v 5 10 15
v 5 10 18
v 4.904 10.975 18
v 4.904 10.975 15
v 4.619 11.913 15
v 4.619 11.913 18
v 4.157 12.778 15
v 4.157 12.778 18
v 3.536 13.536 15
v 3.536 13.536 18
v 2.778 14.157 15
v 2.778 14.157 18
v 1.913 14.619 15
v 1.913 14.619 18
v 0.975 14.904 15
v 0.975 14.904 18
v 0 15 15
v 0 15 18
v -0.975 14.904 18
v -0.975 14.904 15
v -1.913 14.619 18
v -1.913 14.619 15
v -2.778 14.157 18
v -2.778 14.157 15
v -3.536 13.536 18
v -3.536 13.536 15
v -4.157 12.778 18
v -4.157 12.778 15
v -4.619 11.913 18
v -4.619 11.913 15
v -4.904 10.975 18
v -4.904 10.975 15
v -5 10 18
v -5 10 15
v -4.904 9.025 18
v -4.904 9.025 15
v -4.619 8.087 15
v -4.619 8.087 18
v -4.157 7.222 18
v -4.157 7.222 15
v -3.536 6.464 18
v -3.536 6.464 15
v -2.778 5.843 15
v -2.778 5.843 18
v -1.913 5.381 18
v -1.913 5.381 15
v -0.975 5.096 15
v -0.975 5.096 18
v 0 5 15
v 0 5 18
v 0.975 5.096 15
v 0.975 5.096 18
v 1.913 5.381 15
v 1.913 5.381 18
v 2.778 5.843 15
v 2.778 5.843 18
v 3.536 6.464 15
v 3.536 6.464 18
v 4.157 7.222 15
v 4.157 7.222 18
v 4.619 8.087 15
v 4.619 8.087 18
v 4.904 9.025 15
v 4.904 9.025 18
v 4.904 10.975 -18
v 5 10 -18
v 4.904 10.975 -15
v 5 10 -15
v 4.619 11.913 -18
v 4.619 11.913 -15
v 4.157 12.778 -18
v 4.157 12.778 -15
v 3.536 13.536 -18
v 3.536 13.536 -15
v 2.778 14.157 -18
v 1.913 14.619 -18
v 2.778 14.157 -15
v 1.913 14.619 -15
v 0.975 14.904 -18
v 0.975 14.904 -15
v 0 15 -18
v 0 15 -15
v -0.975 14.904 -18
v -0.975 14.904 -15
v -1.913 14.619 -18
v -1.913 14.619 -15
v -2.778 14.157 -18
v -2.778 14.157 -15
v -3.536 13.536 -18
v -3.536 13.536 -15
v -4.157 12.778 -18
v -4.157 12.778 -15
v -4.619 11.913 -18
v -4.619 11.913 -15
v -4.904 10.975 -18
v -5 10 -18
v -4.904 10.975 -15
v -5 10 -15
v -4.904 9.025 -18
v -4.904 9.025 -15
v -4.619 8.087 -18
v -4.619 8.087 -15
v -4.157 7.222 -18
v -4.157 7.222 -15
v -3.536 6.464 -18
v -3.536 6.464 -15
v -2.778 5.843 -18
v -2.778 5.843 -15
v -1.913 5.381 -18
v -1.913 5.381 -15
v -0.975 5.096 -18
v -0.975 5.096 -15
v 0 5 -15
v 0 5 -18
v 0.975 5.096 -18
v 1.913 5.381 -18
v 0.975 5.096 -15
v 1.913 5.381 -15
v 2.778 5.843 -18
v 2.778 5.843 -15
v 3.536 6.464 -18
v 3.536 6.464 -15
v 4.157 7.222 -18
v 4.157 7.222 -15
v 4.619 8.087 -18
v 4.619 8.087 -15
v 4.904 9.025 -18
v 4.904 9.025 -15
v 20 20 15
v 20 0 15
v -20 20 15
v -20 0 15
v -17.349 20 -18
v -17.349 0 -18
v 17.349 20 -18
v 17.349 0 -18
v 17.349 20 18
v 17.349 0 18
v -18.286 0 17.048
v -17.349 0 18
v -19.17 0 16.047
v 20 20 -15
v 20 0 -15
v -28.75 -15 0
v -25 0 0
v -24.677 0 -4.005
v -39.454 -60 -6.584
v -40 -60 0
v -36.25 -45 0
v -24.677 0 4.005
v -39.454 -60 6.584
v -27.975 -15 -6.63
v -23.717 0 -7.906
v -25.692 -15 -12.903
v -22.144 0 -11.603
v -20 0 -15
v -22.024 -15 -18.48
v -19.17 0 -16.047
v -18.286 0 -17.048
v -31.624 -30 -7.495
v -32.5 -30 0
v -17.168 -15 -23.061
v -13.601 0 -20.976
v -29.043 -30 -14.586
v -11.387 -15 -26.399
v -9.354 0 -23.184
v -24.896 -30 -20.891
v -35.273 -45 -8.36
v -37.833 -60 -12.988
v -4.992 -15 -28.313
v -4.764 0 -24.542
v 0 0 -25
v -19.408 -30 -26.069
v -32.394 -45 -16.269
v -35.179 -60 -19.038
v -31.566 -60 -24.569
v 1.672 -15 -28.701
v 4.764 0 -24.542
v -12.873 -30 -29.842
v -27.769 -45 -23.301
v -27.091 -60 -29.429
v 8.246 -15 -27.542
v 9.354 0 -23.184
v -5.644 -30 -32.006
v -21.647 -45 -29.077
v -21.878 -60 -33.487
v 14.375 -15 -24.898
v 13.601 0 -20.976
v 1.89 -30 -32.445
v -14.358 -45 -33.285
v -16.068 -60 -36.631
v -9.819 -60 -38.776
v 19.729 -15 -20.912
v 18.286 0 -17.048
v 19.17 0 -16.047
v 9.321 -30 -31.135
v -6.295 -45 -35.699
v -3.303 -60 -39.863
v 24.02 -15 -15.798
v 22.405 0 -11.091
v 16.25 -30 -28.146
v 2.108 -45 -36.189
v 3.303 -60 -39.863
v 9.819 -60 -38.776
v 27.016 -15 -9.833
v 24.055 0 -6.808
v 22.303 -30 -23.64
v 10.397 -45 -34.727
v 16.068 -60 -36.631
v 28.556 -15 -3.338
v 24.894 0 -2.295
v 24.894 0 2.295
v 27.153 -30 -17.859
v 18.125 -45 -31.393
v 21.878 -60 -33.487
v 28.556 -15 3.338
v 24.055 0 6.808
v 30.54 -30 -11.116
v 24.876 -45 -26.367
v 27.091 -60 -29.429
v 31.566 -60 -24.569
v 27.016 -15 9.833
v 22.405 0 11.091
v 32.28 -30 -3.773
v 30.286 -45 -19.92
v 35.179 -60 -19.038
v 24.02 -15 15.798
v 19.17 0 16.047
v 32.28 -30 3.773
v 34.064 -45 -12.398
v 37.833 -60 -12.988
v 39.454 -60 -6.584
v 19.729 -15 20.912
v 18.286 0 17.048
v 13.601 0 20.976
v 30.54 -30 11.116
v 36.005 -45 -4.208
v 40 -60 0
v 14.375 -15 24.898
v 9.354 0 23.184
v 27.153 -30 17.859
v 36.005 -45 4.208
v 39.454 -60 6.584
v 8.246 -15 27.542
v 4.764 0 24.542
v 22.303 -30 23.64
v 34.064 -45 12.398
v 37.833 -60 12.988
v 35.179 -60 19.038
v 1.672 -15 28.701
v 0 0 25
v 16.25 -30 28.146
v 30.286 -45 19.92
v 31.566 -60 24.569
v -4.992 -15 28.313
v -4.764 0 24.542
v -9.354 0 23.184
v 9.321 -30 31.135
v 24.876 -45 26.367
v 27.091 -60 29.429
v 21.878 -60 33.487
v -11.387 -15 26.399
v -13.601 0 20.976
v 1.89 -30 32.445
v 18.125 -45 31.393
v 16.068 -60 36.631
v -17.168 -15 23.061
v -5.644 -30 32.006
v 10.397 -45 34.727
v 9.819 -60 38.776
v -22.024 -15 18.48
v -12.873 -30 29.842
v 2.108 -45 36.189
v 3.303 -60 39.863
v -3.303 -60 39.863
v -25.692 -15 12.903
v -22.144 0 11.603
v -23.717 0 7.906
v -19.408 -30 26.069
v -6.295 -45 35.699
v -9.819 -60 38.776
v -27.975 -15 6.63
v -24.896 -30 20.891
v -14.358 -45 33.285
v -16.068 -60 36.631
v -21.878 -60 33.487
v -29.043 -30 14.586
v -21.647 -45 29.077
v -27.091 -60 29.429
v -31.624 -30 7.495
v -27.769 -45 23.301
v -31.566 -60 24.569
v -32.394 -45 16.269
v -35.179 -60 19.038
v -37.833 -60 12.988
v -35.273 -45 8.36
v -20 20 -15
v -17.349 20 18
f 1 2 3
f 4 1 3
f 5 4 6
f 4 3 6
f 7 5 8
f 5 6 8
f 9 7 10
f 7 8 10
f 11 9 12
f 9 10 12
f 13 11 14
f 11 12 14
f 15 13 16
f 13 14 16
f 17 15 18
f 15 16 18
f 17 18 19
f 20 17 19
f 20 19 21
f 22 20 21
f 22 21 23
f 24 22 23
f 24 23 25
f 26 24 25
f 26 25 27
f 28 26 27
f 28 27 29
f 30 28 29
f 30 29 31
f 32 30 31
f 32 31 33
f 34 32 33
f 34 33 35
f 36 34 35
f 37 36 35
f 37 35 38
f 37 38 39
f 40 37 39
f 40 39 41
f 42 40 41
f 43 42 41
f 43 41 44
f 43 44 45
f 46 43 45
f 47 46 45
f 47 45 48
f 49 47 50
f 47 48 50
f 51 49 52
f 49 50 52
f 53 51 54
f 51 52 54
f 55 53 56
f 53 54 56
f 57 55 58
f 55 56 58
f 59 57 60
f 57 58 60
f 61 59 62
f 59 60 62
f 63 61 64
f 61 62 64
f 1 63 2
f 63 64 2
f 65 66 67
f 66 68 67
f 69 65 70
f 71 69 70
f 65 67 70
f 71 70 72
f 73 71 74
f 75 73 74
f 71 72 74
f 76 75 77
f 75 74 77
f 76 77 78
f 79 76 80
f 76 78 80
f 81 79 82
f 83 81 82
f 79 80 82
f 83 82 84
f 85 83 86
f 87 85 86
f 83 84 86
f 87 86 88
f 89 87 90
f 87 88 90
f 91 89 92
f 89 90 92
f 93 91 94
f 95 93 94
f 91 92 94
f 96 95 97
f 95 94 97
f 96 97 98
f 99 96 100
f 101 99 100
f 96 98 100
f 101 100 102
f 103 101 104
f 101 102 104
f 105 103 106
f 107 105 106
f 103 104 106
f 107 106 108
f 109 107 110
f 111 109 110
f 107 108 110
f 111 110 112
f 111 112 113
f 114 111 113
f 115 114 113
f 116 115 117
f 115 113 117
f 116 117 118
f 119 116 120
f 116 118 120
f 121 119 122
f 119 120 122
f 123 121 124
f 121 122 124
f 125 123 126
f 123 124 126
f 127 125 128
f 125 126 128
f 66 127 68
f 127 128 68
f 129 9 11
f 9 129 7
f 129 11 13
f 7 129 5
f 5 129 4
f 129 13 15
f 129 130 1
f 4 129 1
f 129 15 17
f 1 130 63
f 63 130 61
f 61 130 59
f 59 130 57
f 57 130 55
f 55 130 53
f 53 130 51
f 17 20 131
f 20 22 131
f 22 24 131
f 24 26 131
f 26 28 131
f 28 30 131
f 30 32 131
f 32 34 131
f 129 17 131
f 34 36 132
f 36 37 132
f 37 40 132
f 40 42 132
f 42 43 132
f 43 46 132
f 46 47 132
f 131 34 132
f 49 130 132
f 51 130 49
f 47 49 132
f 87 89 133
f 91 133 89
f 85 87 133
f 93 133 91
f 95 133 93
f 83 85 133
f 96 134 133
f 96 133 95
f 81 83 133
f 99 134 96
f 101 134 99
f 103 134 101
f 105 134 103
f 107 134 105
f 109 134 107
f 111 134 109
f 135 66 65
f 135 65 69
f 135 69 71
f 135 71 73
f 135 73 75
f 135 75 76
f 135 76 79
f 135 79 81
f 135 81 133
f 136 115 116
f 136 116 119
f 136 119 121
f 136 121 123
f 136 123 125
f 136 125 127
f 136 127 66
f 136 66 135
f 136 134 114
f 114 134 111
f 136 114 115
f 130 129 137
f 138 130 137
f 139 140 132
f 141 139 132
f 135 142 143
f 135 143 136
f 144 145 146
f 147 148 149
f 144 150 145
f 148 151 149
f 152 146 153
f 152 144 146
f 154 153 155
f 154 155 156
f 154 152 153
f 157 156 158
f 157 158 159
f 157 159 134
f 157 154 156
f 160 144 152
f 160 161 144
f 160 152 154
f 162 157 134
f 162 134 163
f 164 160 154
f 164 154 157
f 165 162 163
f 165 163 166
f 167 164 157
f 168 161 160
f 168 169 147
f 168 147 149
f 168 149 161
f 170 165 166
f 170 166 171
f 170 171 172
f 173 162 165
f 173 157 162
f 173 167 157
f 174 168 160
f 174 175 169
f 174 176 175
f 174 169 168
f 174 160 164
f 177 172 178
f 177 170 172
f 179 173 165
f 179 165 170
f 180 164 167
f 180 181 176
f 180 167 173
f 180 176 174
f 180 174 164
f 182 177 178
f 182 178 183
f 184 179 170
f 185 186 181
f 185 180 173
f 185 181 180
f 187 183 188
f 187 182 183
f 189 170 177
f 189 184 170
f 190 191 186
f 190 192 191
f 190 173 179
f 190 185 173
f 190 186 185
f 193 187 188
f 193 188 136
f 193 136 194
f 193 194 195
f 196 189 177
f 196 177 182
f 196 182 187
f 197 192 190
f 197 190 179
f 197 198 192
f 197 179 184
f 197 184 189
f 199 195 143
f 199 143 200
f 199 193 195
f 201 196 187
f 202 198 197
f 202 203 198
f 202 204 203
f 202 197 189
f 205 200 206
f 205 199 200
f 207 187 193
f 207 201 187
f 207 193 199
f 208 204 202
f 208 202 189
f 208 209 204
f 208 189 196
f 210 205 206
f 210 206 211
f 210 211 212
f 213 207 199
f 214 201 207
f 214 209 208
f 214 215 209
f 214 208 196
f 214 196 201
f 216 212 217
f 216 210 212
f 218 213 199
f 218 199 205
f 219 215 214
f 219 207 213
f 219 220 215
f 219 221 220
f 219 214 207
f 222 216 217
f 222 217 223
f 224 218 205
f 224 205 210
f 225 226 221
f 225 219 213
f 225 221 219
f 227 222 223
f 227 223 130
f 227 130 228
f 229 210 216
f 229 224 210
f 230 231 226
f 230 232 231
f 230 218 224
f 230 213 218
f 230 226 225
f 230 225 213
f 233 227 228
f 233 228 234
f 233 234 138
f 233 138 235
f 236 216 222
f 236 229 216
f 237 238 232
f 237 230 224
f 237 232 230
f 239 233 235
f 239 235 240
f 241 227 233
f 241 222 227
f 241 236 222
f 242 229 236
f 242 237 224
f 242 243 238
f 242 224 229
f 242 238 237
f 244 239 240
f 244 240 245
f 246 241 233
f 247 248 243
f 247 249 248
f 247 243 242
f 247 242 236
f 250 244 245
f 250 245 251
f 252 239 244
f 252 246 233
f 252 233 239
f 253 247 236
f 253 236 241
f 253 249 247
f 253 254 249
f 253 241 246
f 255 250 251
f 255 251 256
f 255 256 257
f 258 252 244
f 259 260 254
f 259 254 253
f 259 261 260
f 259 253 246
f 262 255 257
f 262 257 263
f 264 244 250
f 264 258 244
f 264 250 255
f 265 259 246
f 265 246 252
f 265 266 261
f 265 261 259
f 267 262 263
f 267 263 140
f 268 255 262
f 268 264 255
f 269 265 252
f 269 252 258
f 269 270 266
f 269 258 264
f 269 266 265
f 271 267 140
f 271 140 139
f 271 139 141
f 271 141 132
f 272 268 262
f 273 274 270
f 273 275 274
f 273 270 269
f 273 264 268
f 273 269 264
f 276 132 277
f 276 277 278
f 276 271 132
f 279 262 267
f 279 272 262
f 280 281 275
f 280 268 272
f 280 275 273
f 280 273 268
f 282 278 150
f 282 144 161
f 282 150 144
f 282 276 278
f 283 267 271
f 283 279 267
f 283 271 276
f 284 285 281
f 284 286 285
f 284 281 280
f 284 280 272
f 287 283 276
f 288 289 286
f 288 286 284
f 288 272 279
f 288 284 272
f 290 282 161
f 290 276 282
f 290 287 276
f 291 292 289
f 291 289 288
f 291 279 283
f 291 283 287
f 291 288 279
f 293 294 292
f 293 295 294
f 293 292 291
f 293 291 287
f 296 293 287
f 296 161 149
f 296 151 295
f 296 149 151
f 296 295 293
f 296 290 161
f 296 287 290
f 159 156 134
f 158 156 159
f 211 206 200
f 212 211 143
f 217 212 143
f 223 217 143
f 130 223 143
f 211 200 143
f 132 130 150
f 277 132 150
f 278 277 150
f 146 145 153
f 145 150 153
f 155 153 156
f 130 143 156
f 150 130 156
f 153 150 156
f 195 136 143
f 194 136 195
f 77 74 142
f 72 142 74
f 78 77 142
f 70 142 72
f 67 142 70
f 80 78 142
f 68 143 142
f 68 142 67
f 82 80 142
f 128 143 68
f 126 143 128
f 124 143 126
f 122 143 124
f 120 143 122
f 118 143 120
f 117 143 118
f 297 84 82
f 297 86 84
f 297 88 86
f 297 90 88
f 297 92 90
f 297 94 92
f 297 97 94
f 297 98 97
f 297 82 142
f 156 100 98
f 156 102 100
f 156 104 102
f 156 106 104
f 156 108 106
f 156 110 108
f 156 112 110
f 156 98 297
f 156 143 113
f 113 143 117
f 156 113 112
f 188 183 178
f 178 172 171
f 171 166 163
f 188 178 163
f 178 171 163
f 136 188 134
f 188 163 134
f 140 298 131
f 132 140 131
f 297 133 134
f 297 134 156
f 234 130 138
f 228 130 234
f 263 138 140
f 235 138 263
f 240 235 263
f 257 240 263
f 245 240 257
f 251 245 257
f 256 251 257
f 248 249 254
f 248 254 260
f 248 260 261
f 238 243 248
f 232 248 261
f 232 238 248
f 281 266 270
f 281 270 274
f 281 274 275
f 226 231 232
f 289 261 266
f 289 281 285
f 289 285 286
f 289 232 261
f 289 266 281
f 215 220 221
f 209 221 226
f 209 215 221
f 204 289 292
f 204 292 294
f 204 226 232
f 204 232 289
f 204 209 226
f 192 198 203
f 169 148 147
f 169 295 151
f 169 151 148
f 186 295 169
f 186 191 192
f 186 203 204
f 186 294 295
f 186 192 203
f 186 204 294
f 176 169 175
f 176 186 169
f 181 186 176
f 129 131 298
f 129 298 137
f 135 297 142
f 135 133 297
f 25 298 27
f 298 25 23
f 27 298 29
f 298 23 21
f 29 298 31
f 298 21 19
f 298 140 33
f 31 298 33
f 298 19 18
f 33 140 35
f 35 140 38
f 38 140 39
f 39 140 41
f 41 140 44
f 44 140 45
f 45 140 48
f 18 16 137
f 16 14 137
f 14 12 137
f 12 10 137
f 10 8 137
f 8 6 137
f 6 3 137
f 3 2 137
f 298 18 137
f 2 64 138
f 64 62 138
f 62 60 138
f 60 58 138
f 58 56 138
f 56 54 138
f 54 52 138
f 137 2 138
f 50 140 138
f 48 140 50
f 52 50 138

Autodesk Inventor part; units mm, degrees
ref_plane "YZ Plane" through (0, 0, 0) normal (1, 0, 0) x (0, 1, 0)
ref_plane "XZ Plane" through (0, 0, 0) normal (0, 1, 0) x (-1, 0, 0)
ref_plane "XY Plane" through (0, 0, 0) normal (0, 0, 1) x (1, 0, 0)
sketch "Sketch1" plane through (0, 0, 0) normal (0, 0, 1) x (1, 0, 0)
  line L0 (0, 0) -> (0, -60)
  line L1 (0, -60) -> (-40, -60)
  line L2 (0, 0) -> (-25, 0)
  line L3 (-25, 0) -> (-40, -60)
  dimension "d0" = 40
  dimension "d1" = 25
  dimension "d2" = 60
revolve "Revolution1" add sketch "Sketch1" angle 360 about axis through (0, 0, 0) along (0, -1, 0)
sketch "Sketch2" plane through (0, 0, 0) normal (0, 1, 0) x (1, 0, 0)
  line L0 (0, 0) -> (0, 15)
  line L1 (0, 15) -> (-20, 15)
  circle A0 centre (0, 0) radius 25 projected
  line L2 (0, 15) -> (20, 15)
  line L3 (0, 0) -> (-17.5771, 0)
  line L4 (0, -15) -> (-20, -15)
  line L5 (0, -15) -> (20, -15)
  line L6 (-17.3494, -18) -> (17.3494, -18)
  line L7 (-17.3494, -18) -> (-20, -15)
  line L8 (20, -15) -> (17.3494, -18)
  line L9 (0, 0) -> (12.1648, 0)
  line L10 (-17.3494, 18) -> (17.3494, 18)
  line L11 (-17.3494, 18) -> (-20, 15)
  line L12 (20, 15) -> (17.3494, 18)
  dimension "d4" = 15
  dimension "d10" = 3
extrude "Extrusion1" add sketch "Sketch2" along normal blind 20 contours L1 L11 L10 L12 L2 | L4 L5 L8 L6 L7
sketch "Sketch3" plane through (-17.3494, 0, 18) normal (0, 0, 1) x (1, 0, 0)
  line L0 (34.6987, 0) -> (34.6987, 20) projected
  line L1 (0, 0) -> (0, 20) projected
  line L2 (34.6987, 20) -> (0, 0)
  line L3 (34.6987, 0) -> (0, 0) projected
  line L4 (34.6987, 0) -> (0, 20)
  circle A0 centre (17.3494, 10) radius 5
  point P0 (17.3494, 0)
  dimension "d7" = 10
extrude "Extrusion2" cut sketch "Sketch3" against normal blind 60 contours A0 L2 L4 | L4 L2 A0 | L2 L4 A0 | A0 L4 L2
properties part number "base"
